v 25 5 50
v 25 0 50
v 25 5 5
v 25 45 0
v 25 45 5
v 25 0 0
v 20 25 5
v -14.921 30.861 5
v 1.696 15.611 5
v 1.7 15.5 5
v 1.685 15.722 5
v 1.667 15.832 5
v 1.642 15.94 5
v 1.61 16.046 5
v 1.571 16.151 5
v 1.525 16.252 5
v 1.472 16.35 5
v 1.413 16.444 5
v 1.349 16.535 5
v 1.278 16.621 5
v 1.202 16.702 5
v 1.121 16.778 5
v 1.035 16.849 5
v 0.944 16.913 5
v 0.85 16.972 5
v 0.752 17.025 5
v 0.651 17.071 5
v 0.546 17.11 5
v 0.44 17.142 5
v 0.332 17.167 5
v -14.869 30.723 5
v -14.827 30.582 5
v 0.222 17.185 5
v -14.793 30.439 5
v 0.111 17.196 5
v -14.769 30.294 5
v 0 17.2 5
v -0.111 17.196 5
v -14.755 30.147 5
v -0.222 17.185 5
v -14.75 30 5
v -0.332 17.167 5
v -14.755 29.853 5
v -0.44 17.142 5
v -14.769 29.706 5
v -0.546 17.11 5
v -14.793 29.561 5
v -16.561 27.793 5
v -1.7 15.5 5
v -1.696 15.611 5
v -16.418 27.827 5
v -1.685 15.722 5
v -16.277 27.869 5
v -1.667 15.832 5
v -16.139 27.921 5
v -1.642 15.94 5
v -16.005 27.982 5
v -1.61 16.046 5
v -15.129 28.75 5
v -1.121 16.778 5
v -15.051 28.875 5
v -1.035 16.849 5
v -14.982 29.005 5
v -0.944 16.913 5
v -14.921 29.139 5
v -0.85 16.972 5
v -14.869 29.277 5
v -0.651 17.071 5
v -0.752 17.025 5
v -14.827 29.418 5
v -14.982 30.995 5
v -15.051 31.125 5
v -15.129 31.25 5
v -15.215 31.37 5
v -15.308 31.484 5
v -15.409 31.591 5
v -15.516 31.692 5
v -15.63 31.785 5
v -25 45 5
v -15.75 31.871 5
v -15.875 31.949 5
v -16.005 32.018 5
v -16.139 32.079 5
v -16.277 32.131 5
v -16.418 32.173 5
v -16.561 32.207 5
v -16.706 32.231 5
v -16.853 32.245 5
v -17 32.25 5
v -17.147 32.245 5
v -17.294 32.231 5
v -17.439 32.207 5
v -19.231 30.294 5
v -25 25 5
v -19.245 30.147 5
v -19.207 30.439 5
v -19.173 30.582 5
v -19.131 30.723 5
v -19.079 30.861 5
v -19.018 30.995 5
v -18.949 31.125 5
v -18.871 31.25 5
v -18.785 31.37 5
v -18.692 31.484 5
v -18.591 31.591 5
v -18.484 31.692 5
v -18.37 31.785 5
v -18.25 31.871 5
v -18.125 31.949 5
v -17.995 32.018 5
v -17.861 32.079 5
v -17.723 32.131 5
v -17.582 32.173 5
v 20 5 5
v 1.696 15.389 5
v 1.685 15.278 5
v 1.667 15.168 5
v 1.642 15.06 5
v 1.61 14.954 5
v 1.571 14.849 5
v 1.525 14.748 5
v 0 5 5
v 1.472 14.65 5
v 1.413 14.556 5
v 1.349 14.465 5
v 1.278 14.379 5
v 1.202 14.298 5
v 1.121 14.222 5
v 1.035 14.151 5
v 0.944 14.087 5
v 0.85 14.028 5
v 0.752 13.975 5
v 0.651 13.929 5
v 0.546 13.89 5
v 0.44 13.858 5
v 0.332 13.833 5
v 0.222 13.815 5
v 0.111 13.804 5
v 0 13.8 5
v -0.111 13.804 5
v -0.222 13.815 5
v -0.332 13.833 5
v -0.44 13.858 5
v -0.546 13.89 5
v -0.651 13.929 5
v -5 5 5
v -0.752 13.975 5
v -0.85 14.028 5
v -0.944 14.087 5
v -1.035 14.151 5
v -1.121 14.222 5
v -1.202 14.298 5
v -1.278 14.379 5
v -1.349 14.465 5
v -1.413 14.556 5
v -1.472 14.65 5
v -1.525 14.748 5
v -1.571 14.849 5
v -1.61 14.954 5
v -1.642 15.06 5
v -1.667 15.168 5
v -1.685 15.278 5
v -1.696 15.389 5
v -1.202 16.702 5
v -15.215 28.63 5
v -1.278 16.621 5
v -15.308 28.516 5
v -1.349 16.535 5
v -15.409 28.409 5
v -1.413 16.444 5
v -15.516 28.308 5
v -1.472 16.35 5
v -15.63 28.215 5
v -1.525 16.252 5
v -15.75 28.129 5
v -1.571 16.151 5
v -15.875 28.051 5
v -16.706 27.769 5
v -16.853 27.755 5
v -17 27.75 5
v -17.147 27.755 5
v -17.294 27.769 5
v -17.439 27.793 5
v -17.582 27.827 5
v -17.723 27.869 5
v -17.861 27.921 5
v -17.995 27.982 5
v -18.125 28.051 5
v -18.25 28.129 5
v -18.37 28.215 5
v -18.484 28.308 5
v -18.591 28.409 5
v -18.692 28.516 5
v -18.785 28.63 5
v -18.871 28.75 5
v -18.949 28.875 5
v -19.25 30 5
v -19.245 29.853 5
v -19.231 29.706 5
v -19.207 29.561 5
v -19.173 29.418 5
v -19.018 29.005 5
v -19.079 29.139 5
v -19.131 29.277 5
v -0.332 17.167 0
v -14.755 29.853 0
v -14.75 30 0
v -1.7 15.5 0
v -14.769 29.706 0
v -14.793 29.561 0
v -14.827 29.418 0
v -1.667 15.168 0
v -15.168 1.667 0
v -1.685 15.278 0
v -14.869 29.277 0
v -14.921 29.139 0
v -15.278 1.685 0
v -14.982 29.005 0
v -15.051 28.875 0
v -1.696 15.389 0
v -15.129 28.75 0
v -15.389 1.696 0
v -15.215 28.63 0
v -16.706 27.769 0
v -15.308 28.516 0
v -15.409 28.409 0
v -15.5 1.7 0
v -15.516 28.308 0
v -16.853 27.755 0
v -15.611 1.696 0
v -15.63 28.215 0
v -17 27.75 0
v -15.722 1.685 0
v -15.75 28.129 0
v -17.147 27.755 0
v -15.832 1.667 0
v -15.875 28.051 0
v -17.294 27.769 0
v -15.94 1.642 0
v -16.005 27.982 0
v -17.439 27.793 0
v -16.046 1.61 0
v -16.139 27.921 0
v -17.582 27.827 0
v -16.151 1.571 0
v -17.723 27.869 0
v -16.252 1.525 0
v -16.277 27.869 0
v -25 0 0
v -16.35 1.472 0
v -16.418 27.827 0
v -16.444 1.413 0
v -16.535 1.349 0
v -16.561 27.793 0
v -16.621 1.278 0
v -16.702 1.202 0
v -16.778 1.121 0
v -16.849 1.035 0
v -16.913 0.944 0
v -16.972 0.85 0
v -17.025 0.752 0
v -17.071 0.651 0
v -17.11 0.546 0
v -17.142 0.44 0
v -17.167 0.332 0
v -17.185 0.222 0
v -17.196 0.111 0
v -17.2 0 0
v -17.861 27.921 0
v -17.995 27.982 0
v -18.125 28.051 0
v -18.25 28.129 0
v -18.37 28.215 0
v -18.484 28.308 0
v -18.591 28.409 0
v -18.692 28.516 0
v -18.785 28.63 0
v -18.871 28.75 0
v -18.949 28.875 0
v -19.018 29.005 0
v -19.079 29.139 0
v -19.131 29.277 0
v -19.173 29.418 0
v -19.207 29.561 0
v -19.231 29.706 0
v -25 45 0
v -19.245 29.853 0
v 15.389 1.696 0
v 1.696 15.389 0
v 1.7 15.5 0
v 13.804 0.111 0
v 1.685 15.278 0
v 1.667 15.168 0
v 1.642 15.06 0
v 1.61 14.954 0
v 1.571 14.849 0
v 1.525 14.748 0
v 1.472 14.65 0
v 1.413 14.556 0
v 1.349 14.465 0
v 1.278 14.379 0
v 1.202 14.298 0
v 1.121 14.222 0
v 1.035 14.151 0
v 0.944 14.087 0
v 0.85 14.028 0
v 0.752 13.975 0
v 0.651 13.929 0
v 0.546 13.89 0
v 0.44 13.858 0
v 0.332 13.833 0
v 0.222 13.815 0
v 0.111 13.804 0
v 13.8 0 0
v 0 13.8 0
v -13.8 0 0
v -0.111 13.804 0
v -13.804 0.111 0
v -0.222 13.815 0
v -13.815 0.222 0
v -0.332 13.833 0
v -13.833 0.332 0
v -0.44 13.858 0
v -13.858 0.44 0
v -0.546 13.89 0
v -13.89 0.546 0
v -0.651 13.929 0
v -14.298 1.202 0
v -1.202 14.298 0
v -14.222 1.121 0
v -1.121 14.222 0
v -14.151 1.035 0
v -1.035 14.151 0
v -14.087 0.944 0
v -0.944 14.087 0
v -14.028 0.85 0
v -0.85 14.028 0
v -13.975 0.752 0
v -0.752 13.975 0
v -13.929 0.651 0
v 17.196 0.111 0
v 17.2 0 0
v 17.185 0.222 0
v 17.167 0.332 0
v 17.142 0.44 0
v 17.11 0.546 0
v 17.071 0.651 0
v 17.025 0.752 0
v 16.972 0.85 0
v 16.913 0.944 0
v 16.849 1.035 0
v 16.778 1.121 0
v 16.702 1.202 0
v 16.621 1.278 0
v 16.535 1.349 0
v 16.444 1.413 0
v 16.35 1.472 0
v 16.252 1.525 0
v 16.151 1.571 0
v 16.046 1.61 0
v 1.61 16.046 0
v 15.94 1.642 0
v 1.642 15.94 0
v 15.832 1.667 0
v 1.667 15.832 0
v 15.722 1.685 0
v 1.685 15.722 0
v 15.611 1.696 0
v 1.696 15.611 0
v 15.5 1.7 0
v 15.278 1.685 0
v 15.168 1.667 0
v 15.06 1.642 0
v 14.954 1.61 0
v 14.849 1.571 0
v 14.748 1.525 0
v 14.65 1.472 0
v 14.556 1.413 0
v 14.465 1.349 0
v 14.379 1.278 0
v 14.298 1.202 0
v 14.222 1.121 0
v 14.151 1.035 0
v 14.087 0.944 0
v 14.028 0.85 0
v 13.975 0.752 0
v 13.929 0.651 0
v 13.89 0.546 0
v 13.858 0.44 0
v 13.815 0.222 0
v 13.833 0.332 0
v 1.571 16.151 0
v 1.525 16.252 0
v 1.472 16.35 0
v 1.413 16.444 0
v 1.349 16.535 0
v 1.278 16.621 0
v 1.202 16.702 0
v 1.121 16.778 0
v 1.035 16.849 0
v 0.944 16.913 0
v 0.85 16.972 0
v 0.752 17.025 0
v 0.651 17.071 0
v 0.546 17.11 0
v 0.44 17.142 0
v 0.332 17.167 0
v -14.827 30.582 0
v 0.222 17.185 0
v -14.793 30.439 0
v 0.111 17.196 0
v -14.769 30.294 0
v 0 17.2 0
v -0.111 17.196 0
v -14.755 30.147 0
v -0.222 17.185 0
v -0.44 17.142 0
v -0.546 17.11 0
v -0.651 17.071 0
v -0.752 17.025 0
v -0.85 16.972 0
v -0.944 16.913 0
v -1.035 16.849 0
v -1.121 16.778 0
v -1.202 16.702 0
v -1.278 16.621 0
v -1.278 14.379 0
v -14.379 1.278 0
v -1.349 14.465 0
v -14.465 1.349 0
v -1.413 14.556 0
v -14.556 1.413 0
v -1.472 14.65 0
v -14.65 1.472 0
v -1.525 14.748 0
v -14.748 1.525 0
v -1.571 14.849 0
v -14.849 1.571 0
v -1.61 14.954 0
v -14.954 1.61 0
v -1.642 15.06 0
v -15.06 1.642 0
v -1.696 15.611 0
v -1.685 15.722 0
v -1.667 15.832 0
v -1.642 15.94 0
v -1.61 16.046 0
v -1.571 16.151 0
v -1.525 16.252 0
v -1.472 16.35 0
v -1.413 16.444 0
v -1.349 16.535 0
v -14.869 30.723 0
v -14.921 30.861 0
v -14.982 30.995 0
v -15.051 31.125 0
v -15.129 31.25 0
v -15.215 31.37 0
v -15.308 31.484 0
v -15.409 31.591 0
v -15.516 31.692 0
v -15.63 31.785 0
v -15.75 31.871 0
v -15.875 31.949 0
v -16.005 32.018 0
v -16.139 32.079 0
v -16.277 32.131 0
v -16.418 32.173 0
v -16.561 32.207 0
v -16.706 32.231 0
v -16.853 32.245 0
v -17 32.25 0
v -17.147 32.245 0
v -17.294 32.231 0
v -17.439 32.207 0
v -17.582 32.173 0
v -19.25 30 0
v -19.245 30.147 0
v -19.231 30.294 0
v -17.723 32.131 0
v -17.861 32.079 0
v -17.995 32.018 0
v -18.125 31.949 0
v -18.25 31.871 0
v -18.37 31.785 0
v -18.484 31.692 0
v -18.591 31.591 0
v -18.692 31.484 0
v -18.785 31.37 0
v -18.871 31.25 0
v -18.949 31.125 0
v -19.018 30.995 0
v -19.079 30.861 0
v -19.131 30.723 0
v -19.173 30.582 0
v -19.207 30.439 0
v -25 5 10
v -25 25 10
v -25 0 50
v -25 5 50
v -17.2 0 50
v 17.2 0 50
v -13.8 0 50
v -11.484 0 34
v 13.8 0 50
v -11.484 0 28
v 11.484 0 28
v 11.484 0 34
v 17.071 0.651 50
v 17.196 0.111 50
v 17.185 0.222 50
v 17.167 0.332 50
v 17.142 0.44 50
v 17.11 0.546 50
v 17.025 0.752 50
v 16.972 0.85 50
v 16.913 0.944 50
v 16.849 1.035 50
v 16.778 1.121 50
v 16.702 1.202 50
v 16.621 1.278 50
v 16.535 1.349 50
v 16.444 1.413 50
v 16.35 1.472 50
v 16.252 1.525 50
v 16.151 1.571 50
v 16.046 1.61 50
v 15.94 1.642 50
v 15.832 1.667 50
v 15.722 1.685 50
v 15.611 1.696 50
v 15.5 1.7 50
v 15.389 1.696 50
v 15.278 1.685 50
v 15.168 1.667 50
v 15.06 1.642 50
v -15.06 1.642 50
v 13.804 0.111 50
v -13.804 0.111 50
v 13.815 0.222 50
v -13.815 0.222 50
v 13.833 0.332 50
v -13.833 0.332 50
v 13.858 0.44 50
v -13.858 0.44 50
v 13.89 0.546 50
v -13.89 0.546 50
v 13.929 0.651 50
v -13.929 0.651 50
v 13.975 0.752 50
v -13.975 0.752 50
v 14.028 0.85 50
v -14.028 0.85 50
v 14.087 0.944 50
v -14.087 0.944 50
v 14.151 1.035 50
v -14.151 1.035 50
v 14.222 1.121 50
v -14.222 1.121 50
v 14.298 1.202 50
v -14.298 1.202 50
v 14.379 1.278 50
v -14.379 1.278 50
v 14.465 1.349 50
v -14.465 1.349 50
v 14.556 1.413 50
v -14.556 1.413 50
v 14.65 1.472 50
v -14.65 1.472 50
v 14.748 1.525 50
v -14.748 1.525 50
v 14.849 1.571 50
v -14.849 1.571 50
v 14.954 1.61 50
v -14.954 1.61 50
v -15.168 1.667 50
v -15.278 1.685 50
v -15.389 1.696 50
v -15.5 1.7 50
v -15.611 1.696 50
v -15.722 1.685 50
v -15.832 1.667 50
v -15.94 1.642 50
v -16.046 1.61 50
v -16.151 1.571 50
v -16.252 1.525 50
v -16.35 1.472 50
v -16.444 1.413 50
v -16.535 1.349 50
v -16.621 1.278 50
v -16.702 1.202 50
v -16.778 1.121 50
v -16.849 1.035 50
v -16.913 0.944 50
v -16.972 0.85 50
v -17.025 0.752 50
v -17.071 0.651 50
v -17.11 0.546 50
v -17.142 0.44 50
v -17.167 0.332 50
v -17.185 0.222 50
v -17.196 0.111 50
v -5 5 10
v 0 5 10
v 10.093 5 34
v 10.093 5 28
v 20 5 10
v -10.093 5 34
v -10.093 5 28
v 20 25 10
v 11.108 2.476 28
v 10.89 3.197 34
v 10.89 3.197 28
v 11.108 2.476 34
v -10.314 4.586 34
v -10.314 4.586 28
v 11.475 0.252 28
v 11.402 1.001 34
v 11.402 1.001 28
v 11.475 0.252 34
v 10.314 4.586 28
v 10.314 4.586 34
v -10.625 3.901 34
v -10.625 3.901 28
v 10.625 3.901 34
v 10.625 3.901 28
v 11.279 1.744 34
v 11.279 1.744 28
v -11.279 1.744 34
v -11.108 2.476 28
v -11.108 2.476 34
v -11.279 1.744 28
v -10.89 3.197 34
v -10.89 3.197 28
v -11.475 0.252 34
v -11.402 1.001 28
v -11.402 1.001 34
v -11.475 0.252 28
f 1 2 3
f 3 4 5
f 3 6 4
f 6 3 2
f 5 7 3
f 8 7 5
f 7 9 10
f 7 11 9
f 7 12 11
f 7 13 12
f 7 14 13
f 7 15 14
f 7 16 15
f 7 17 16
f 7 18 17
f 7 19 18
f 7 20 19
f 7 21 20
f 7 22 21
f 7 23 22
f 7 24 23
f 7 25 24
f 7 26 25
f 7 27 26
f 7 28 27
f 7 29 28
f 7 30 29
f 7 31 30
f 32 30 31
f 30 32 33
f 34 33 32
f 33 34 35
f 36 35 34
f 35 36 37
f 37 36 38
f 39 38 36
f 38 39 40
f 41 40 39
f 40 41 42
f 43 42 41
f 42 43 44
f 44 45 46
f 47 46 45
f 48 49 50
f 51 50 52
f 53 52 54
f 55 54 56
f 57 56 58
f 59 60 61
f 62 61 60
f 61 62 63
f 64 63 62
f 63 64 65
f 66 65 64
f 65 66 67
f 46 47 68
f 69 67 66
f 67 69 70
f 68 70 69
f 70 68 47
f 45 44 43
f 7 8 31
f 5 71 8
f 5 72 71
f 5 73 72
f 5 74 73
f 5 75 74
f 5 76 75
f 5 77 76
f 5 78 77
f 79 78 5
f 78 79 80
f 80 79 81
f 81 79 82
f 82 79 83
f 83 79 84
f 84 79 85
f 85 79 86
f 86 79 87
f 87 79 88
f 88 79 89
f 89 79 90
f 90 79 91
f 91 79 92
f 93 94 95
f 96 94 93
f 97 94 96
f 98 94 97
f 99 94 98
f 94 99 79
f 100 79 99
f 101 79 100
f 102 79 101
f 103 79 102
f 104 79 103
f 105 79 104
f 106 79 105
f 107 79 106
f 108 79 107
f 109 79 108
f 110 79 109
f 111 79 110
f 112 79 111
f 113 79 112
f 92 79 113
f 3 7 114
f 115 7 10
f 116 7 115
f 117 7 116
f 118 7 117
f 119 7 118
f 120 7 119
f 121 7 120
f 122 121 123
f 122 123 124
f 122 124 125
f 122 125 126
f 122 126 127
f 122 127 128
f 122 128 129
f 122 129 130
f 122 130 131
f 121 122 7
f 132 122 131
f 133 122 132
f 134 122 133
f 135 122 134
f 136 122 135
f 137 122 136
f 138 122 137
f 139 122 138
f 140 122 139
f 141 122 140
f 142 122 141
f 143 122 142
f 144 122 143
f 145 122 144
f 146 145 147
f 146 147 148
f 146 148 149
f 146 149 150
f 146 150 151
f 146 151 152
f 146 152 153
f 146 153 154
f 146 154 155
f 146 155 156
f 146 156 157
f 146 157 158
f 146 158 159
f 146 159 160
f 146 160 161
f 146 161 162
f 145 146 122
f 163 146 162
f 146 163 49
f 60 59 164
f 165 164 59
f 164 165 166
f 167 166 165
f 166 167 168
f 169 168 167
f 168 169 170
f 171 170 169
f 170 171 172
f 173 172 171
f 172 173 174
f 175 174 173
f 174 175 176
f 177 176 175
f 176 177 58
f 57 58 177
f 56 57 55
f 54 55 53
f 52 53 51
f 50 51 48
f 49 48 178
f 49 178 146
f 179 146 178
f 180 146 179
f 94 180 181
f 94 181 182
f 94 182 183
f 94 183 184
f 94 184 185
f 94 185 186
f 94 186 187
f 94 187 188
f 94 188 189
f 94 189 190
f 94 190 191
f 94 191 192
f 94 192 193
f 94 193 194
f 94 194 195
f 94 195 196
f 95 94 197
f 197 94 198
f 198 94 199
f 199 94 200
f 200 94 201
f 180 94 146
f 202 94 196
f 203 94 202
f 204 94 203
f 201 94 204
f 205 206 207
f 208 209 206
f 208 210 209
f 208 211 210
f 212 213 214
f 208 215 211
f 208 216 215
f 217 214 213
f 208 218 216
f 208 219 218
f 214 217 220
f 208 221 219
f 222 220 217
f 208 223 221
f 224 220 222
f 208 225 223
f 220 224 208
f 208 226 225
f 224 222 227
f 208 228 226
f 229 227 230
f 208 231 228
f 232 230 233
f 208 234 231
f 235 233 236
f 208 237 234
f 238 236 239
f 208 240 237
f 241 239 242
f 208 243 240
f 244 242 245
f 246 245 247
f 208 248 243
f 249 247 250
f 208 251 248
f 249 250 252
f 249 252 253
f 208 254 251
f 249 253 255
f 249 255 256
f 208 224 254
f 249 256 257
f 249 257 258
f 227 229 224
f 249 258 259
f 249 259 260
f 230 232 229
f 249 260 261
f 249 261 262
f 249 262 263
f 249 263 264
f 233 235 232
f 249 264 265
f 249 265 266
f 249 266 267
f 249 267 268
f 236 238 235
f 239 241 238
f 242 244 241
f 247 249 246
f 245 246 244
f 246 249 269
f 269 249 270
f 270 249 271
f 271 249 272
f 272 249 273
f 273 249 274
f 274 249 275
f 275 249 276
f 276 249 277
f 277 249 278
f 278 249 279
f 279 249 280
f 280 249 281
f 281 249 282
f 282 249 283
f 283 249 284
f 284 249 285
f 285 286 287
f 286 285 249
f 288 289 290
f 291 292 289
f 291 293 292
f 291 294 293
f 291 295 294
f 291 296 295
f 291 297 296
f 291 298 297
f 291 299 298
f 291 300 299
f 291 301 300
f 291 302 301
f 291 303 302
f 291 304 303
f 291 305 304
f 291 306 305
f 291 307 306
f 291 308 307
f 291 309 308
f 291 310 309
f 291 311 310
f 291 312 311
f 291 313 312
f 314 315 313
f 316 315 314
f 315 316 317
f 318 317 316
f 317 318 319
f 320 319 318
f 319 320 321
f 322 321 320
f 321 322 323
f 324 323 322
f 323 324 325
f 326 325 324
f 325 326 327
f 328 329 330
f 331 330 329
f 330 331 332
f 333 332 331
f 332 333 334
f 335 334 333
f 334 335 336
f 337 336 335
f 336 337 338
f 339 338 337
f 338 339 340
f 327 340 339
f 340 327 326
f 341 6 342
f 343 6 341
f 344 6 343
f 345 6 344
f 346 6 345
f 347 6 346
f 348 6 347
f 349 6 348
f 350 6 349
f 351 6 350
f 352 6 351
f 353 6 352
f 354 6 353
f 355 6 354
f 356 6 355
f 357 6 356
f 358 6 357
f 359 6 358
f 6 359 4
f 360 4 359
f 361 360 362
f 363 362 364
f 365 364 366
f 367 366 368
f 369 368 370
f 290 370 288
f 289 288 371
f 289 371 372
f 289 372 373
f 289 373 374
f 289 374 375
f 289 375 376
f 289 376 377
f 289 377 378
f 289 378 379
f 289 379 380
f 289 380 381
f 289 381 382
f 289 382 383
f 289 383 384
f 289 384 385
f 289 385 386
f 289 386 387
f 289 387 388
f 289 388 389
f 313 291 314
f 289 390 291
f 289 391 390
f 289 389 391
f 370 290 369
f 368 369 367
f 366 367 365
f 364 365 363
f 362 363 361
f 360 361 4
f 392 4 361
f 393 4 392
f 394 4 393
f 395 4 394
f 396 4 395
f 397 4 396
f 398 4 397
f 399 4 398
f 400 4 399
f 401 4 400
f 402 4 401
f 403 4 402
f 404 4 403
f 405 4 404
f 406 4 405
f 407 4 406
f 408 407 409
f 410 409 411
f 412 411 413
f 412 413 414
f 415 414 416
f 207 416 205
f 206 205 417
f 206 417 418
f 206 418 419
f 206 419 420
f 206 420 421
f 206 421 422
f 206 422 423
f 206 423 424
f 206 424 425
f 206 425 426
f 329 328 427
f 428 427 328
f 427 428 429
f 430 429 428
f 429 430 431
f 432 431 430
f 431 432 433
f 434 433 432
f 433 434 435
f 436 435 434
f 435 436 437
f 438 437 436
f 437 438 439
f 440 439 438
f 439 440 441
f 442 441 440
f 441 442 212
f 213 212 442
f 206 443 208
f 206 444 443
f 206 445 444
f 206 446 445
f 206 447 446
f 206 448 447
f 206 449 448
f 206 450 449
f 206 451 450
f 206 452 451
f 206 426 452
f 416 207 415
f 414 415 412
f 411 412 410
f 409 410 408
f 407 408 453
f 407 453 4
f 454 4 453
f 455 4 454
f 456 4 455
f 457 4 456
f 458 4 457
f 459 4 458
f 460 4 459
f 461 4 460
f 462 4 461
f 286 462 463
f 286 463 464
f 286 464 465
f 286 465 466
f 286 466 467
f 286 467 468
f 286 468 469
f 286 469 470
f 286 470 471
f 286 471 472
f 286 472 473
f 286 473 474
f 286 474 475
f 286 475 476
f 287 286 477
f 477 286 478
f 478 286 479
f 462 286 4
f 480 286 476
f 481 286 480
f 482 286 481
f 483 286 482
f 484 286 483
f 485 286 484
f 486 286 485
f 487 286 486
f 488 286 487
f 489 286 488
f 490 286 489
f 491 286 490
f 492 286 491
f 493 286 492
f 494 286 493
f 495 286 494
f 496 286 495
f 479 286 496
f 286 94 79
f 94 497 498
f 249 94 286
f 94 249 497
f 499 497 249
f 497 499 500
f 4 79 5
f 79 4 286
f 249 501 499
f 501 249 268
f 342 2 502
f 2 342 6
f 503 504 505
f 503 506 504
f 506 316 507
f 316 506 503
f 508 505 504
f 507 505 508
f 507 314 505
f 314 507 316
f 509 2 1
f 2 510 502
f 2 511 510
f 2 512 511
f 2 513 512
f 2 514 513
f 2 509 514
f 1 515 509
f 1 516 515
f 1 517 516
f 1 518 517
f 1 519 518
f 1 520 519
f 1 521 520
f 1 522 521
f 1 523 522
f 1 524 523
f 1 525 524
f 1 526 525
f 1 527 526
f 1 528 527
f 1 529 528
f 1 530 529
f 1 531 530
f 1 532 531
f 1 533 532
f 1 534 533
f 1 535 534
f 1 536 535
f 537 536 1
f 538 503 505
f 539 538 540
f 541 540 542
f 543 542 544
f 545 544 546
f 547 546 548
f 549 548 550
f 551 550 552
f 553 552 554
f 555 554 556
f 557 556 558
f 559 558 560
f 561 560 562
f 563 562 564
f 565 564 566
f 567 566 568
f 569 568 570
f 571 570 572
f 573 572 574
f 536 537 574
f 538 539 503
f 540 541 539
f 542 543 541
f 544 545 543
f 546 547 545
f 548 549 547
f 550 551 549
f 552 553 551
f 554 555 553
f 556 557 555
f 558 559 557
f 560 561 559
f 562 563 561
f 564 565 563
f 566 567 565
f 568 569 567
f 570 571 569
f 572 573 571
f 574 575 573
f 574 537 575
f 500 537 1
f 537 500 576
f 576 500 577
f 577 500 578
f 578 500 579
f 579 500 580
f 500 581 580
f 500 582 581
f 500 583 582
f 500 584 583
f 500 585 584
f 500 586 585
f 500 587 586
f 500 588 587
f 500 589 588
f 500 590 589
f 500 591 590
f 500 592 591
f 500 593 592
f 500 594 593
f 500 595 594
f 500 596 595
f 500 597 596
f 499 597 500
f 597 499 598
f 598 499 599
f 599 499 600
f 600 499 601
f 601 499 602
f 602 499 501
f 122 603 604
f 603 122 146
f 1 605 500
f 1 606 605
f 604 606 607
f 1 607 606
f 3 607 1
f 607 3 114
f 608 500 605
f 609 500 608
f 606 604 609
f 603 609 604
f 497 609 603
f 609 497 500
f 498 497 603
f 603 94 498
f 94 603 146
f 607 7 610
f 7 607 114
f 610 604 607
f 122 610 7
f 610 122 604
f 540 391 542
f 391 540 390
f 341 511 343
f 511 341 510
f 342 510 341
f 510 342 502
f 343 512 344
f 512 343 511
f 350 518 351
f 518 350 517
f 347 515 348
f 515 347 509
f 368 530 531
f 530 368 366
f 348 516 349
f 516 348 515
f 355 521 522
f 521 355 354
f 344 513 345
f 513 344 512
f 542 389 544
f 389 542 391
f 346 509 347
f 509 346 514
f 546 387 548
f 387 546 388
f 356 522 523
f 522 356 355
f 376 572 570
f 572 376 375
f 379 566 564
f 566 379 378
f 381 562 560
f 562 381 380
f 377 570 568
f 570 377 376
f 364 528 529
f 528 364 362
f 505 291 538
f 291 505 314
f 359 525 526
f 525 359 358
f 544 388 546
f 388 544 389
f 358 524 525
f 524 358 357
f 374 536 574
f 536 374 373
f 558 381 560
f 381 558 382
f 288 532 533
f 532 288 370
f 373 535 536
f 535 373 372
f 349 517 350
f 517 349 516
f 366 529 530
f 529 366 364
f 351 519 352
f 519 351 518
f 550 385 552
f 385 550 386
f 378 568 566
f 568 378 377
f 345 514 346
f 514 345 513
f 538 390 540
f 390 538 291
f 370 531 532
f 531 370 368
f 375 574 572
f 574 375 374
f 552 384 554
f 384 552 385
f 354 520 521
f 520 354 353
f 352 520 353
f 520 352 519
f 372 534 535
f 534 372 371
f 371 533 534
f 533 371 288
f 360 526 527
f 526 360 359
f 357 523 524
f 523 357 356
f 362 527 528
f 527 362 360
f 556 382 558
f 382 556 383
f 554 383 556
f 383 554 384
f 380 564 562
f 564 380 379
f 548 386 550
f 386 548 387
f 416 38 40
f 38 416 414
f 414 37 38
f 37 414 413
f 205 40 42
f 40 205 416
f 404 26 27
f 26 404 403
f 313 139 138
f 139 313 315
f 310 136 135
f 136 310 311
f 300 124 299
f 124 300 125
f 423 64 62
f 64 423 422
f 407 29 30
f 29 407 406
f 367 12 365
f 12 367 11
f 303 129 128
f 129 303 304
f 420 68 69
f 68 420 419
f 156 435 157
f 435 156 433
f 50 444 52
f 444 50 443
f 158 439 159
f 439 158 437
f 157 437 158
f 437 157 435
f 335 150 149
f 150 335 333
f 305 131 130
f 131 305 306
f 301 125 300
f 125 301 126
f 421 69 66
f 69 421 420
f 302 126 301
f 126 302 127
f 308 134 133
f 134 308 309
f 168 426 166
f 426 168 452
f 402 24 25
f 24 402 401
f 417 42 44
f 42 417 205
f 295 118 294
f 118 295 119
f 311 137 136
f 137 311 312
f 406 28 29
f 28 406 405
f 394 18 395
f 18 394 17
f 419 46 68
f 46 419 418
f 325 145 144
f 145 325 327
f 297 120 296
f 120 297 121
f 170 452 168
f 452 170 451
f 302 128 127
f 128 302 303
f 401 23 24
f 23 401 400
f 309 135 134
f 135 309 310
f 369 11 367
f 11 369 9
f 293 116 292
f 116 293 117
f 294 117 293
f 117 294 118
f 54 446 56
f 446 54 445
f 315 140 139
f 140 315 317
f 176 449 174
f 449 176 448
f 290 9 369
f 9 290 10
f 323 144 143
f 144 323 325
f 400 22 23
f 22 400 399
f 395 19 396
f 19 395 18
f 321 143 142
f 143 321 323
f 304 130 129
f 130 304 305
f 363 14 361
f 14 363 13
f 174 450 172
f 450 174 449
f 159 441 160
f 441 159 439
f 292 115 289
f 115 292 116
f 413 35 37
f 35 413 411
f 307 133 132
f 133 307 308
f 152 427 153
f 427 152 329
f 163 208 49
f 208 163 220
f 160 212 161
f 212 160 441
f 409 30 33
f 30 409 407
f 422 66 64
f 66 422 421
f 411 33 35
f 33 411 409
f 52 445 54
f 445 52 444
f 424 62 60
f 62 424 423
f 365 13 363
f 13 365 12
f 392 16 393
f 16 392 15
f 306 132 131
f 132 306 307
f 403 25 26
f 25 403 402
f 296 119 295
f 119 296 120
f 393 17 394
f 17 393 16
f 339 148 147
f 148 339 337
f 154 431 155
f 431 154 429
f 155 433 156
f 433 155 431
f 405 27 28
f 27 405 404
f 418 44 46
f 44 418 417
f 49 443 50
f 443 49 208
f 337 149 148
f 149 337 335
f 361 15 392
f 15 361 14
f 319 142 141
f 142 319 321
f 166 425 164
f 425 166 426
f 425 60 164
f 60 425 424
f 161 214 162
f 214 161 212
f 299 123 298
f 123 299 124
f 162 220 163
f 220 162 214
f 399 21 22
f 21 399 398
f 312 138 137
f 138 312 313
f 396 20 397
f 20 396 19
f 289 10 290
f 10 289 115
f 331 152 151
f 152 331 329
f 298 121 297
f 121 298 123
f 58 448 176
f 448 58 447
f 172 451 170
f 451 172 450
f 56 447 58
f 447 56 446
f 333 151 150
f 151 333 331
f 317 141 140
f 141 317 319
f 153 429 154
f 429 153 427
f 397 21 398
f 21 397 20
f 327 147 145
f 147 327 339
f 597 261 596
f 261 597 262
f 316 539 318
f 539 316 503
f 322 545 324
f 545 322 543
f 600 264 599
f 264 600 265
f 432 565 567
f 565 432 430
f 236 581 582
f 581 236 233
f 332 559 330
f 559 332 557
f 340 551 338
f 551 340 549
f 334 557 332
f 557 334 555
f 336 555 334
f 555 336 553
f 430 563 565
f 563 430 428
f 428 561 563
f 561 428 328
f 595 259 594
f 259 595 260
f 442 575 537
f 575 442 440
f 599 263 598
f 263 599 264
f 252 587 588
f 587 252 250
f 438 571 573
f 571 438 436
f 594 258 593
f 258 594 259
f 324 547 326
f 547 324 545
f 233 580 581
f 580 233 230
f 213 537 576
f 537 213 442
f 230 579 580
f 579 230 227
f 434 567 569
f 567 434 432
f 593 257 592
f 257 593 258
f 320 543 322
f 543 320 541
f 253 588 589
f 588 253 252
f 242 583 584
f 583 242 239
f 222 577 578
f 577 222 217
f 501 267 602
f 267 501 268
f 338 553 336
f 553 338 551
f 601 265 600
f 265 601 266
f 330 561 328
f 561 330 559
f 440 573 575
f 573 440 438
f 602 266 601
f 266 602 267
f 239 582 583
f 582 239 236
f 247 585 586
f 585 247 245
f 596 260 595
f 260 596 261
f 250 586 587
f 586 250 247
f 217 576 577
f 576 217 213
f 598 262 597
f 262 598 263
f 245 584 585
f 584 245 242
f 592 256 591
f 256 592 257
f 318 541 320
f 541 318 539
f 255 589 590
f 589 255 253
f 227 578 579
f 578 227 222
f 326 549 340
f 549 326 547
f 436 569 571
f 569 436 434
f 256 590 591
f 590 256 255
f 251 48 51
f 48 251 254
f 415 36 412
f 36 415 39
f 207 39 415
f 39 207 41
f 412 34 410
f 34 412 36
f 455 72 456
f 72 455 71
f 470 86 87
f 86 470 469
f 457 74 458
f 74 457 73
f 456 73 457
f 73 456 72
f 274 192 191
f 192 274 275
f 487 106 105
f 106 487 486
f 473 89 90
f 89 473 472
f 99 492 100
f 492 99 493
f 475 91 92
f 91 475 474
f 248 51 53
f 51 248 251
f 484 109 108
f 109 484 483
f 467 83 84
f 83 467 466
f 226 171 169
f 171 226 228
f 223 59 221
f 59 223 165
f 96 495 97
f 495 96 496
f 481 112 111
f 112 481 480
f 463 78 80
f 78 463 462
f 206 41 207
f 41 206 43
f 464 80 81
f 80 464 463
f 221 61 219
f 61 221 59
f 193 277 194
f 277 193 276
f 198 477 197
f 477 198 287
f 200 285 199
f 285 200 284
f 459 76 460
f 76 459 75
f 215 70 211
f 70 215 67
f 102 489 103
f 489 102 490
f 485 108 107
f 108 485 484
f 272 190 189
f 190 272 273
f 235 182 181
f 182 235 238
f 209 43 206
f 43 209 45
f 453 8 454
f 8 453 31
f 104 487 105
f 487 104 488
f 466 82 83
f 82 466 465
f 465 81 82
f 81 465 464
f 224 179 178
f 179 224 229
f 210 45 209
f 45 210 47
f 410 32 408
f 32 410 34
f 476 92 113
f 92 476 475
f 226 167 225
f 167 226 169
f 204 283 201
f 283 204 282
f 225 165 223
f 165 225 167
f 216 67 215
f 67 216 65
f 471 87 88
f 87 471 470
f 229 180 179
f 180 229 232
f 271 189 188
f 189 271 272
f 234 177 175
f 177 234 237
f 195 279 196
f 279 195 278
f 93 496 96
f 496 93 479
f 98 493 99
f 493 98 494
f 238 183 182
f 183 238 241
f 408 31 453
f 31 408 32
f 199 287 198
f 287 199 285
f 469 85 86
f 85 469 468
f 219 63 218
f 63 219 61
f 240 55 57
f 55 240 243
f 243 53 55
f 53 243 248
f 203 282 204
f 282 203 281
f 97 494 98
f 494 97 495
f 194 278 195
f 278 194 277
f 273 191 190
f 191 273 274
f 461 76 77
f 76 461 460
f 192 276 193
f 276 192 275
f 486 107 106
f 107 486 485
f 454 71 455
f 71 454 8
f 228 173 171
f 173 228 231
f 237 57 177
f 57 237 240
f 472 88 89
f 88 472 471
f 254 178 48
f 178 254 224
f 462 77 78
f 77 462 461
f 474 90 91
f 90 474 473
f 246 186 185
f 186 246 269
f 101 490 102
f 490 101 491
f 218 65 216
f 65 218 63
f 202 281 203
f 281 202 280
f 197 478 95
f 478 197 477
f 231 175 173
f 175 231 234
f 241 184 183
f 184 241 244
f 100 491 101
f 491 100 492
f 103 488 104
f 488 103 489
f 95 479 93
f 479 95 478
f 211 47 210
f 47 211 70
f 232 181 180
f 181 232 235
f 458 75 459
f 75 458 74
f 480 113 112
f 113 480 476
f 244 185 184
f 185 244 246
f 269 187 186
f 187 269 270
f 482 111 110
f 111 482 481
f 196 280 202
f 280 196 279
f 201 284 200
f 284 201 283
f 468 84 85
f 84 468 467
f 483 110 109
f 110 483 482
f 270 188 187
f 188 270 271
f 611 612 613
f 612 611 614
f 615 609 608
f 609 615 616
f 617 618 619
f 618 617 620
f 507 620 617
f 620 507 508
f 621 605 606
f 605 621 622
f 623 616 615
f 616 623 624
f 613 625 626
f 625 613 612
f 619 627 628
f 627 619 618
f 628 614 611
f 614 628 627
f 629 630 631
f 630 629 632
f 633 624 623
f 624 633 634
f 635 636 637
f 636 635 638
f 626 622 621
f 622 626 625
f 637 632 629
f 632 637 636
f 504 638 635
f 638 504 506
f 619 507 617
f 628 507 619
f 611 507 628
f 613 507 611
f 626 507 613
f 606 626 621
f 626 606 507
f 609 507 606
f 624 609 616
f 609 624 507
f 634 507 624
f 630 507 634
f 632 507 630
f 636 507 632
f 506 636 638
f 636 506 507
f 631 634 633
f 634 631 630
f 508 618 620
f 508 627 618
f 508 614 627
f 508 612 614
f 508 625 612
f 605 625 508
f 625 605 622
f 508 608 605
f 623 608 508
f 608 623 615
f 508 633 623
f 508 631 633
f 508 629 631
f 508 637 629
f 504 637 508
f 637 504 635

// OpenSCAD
// L-shaped mounting bracket for NEMA 17 stepper motor
// Print orientation: base plate on bed (z = 0), motor plate builds upward (+Z)

// ---------------- Parameters ----------------
base_x0      = -25;    // base plate: x start
base_x1      = 25;     // base plate: x end
base_y0      = 0;      // base plate: y start
base_y1      = 45;     // base plate: y end
base_z1      = 5;      // base plate: z end (thickness)

hole_x       = -17;    // M4 through-hole x position (both holes)
hole_y       = 30;     // M4 through-hole y position (both holes)
hole_d       = 4.5;    // M4 hole diameter

plate_x0     = -25;    // motor plate: x start
plate_x1     = 25;     // motor plate: x end
plate_y0     = 0;      // motor plate: y start
plate_y1     = 5;      // motor plate: y end (thickness)
plate_z1     = 50;     // motor plate: z end (height)

boss_d       = 23;     // motor centring boss hole diameter
boss_x       = 0;      // boss hole centre x
boss_z       = 28;     // boss hole centre z

screw_d      = 3.4;    // M3 screw hole diameter
screw_pitch  = 31;     // square pattern side length

gusset_t     = 5;      // gusset thickness (X direction)
gusset_leg   = 20;     // right triangle leg length (Y and Z)
gusset_x0    = -25;    // left gusset x start
gusset_x1    = 20;     // right gusset x end

eps          = 0.5;    // cutter overshoot past faces

$fn = 96;

// ---------------- Model ----------------
difference() {
    union() {
        // Base plate
        translate([base_x0, base_y0, 0])
            cube([base_x1 - base_x0, base_y1 - base_y0, base_z1]);

        // Motor plate
        translate([plate_x0, plate_y0, 0])
            cube([plate_x1 - plate_x0, plate_y1 - plate_y0, plate_z1]);

        // Left gusset (flush with left edge)
        translate([gusset_x0, 0, 5])
            linear_extrude(height = gusset_t)
                polygon(points = [
                    [0, 5],
                    [gusset_leg, 5],
                    [0, gusset_leg + 5]
                ]);

        // Right gusset (flush with right edge)
        translate([gusset_x1, 0, 5])
            linear_extrude(height = gusset_t)
                polygon(points = [
                    [0, 5],
                    [-gusset_leg, 5],
                    [0, gusset_leg + 5]
                ]);
    }

    // Base plate through-holes (M4)
    translate([hole_x, hole_y, -eps])
        cylinder(d = hole_d, h = base_z1 + 2 * eps);

    // Motor boss hole (through along Y)
    translate([boss_x, plate_y0 - eps, boss_z])
        cylinder(d = boss_d, h = plate_y1 - plate_y0 + 2 * eps);

    // M3 screw holes on square pattern centred on boss hole
    for (a = [0, 90, 180, 270])
        rotate([0, 0, a])
            translate([screw_pitch / 2, 0, -eps])
                cylinder(d = screw_d, h = plate_z1 + 2 * eps);
}
